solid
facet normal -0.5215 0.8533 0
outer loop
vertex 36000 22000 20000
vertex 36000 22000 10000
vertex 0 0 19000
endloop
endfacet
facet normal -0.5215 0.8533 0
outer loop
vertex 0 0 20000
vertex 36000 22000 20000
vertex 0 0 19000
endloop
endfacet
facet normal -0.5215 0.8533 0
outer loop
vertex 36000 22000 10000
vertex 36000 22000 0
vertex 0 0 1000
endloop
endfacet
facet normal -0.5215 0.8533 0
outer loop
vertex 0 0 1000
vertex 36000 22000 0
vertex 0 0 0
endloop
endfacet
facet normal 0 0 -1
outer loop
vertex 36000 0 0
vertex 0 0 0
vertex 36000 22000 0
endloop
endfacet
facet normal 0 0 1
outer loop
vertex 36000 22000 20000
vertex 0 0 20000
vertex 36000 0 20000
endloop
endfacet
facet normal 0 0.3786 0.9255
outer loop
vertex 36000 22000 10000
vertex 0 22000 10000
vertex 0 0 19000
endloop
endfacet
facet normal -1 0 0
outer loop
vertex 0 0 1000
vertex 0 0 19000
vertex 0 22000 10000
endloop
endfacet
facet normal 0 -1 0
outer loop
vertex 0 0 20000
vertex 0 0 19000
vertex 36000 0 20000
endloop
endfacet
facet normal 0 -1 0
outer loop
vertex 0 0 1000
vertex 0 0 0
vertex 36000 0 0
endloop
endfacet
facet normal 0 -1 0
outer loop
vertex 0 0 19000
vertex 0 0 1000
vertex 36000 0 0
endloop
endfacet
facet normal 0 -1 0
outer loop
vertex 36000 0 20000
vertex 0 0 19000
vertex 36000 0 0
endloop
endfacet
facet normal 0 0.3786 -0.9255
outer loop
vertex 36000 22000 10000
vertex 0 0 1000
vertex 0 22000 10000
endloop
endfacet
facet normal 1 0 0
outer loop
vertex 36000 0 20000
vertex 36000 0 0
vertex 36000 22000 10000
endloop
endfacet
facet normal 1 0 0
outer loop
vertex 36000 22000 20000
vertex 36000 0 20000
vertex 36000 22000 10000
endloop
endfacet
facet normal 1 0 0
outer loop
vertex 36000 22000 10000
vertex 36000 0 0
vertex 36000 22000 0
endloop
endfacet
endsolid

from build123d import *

# Parameters (mm, degrees)
BOSS_EXTRUDE1_DEPTH = 20000
BOSS_EXTRUDE3_DEPTH = 36000


with BuildPart() as part:
    # Sketch1 → Boss-Extrude1 (new body)
    with BuildSketch(Plane.XY):
        Polygon((0, 0), (36000, 0), (36000, 22000), align=None)
    extrude(amount=BOSS_EXTRUDE1_DEPTH)

    # Sketch3 → Boss-Extrude3 (add)
    with BuildSketch(Plane(origin=(36000, 0, 0), x_dir=(0, 0, -1), z_dir=(1, 0, 0))):
        Polygon((-10000, 22000), (-19000, 0), (-1000, 0), align=None)
    extrude(amount=-BOSS_EXTRUDE3_DEPTH)


solid = part.part
